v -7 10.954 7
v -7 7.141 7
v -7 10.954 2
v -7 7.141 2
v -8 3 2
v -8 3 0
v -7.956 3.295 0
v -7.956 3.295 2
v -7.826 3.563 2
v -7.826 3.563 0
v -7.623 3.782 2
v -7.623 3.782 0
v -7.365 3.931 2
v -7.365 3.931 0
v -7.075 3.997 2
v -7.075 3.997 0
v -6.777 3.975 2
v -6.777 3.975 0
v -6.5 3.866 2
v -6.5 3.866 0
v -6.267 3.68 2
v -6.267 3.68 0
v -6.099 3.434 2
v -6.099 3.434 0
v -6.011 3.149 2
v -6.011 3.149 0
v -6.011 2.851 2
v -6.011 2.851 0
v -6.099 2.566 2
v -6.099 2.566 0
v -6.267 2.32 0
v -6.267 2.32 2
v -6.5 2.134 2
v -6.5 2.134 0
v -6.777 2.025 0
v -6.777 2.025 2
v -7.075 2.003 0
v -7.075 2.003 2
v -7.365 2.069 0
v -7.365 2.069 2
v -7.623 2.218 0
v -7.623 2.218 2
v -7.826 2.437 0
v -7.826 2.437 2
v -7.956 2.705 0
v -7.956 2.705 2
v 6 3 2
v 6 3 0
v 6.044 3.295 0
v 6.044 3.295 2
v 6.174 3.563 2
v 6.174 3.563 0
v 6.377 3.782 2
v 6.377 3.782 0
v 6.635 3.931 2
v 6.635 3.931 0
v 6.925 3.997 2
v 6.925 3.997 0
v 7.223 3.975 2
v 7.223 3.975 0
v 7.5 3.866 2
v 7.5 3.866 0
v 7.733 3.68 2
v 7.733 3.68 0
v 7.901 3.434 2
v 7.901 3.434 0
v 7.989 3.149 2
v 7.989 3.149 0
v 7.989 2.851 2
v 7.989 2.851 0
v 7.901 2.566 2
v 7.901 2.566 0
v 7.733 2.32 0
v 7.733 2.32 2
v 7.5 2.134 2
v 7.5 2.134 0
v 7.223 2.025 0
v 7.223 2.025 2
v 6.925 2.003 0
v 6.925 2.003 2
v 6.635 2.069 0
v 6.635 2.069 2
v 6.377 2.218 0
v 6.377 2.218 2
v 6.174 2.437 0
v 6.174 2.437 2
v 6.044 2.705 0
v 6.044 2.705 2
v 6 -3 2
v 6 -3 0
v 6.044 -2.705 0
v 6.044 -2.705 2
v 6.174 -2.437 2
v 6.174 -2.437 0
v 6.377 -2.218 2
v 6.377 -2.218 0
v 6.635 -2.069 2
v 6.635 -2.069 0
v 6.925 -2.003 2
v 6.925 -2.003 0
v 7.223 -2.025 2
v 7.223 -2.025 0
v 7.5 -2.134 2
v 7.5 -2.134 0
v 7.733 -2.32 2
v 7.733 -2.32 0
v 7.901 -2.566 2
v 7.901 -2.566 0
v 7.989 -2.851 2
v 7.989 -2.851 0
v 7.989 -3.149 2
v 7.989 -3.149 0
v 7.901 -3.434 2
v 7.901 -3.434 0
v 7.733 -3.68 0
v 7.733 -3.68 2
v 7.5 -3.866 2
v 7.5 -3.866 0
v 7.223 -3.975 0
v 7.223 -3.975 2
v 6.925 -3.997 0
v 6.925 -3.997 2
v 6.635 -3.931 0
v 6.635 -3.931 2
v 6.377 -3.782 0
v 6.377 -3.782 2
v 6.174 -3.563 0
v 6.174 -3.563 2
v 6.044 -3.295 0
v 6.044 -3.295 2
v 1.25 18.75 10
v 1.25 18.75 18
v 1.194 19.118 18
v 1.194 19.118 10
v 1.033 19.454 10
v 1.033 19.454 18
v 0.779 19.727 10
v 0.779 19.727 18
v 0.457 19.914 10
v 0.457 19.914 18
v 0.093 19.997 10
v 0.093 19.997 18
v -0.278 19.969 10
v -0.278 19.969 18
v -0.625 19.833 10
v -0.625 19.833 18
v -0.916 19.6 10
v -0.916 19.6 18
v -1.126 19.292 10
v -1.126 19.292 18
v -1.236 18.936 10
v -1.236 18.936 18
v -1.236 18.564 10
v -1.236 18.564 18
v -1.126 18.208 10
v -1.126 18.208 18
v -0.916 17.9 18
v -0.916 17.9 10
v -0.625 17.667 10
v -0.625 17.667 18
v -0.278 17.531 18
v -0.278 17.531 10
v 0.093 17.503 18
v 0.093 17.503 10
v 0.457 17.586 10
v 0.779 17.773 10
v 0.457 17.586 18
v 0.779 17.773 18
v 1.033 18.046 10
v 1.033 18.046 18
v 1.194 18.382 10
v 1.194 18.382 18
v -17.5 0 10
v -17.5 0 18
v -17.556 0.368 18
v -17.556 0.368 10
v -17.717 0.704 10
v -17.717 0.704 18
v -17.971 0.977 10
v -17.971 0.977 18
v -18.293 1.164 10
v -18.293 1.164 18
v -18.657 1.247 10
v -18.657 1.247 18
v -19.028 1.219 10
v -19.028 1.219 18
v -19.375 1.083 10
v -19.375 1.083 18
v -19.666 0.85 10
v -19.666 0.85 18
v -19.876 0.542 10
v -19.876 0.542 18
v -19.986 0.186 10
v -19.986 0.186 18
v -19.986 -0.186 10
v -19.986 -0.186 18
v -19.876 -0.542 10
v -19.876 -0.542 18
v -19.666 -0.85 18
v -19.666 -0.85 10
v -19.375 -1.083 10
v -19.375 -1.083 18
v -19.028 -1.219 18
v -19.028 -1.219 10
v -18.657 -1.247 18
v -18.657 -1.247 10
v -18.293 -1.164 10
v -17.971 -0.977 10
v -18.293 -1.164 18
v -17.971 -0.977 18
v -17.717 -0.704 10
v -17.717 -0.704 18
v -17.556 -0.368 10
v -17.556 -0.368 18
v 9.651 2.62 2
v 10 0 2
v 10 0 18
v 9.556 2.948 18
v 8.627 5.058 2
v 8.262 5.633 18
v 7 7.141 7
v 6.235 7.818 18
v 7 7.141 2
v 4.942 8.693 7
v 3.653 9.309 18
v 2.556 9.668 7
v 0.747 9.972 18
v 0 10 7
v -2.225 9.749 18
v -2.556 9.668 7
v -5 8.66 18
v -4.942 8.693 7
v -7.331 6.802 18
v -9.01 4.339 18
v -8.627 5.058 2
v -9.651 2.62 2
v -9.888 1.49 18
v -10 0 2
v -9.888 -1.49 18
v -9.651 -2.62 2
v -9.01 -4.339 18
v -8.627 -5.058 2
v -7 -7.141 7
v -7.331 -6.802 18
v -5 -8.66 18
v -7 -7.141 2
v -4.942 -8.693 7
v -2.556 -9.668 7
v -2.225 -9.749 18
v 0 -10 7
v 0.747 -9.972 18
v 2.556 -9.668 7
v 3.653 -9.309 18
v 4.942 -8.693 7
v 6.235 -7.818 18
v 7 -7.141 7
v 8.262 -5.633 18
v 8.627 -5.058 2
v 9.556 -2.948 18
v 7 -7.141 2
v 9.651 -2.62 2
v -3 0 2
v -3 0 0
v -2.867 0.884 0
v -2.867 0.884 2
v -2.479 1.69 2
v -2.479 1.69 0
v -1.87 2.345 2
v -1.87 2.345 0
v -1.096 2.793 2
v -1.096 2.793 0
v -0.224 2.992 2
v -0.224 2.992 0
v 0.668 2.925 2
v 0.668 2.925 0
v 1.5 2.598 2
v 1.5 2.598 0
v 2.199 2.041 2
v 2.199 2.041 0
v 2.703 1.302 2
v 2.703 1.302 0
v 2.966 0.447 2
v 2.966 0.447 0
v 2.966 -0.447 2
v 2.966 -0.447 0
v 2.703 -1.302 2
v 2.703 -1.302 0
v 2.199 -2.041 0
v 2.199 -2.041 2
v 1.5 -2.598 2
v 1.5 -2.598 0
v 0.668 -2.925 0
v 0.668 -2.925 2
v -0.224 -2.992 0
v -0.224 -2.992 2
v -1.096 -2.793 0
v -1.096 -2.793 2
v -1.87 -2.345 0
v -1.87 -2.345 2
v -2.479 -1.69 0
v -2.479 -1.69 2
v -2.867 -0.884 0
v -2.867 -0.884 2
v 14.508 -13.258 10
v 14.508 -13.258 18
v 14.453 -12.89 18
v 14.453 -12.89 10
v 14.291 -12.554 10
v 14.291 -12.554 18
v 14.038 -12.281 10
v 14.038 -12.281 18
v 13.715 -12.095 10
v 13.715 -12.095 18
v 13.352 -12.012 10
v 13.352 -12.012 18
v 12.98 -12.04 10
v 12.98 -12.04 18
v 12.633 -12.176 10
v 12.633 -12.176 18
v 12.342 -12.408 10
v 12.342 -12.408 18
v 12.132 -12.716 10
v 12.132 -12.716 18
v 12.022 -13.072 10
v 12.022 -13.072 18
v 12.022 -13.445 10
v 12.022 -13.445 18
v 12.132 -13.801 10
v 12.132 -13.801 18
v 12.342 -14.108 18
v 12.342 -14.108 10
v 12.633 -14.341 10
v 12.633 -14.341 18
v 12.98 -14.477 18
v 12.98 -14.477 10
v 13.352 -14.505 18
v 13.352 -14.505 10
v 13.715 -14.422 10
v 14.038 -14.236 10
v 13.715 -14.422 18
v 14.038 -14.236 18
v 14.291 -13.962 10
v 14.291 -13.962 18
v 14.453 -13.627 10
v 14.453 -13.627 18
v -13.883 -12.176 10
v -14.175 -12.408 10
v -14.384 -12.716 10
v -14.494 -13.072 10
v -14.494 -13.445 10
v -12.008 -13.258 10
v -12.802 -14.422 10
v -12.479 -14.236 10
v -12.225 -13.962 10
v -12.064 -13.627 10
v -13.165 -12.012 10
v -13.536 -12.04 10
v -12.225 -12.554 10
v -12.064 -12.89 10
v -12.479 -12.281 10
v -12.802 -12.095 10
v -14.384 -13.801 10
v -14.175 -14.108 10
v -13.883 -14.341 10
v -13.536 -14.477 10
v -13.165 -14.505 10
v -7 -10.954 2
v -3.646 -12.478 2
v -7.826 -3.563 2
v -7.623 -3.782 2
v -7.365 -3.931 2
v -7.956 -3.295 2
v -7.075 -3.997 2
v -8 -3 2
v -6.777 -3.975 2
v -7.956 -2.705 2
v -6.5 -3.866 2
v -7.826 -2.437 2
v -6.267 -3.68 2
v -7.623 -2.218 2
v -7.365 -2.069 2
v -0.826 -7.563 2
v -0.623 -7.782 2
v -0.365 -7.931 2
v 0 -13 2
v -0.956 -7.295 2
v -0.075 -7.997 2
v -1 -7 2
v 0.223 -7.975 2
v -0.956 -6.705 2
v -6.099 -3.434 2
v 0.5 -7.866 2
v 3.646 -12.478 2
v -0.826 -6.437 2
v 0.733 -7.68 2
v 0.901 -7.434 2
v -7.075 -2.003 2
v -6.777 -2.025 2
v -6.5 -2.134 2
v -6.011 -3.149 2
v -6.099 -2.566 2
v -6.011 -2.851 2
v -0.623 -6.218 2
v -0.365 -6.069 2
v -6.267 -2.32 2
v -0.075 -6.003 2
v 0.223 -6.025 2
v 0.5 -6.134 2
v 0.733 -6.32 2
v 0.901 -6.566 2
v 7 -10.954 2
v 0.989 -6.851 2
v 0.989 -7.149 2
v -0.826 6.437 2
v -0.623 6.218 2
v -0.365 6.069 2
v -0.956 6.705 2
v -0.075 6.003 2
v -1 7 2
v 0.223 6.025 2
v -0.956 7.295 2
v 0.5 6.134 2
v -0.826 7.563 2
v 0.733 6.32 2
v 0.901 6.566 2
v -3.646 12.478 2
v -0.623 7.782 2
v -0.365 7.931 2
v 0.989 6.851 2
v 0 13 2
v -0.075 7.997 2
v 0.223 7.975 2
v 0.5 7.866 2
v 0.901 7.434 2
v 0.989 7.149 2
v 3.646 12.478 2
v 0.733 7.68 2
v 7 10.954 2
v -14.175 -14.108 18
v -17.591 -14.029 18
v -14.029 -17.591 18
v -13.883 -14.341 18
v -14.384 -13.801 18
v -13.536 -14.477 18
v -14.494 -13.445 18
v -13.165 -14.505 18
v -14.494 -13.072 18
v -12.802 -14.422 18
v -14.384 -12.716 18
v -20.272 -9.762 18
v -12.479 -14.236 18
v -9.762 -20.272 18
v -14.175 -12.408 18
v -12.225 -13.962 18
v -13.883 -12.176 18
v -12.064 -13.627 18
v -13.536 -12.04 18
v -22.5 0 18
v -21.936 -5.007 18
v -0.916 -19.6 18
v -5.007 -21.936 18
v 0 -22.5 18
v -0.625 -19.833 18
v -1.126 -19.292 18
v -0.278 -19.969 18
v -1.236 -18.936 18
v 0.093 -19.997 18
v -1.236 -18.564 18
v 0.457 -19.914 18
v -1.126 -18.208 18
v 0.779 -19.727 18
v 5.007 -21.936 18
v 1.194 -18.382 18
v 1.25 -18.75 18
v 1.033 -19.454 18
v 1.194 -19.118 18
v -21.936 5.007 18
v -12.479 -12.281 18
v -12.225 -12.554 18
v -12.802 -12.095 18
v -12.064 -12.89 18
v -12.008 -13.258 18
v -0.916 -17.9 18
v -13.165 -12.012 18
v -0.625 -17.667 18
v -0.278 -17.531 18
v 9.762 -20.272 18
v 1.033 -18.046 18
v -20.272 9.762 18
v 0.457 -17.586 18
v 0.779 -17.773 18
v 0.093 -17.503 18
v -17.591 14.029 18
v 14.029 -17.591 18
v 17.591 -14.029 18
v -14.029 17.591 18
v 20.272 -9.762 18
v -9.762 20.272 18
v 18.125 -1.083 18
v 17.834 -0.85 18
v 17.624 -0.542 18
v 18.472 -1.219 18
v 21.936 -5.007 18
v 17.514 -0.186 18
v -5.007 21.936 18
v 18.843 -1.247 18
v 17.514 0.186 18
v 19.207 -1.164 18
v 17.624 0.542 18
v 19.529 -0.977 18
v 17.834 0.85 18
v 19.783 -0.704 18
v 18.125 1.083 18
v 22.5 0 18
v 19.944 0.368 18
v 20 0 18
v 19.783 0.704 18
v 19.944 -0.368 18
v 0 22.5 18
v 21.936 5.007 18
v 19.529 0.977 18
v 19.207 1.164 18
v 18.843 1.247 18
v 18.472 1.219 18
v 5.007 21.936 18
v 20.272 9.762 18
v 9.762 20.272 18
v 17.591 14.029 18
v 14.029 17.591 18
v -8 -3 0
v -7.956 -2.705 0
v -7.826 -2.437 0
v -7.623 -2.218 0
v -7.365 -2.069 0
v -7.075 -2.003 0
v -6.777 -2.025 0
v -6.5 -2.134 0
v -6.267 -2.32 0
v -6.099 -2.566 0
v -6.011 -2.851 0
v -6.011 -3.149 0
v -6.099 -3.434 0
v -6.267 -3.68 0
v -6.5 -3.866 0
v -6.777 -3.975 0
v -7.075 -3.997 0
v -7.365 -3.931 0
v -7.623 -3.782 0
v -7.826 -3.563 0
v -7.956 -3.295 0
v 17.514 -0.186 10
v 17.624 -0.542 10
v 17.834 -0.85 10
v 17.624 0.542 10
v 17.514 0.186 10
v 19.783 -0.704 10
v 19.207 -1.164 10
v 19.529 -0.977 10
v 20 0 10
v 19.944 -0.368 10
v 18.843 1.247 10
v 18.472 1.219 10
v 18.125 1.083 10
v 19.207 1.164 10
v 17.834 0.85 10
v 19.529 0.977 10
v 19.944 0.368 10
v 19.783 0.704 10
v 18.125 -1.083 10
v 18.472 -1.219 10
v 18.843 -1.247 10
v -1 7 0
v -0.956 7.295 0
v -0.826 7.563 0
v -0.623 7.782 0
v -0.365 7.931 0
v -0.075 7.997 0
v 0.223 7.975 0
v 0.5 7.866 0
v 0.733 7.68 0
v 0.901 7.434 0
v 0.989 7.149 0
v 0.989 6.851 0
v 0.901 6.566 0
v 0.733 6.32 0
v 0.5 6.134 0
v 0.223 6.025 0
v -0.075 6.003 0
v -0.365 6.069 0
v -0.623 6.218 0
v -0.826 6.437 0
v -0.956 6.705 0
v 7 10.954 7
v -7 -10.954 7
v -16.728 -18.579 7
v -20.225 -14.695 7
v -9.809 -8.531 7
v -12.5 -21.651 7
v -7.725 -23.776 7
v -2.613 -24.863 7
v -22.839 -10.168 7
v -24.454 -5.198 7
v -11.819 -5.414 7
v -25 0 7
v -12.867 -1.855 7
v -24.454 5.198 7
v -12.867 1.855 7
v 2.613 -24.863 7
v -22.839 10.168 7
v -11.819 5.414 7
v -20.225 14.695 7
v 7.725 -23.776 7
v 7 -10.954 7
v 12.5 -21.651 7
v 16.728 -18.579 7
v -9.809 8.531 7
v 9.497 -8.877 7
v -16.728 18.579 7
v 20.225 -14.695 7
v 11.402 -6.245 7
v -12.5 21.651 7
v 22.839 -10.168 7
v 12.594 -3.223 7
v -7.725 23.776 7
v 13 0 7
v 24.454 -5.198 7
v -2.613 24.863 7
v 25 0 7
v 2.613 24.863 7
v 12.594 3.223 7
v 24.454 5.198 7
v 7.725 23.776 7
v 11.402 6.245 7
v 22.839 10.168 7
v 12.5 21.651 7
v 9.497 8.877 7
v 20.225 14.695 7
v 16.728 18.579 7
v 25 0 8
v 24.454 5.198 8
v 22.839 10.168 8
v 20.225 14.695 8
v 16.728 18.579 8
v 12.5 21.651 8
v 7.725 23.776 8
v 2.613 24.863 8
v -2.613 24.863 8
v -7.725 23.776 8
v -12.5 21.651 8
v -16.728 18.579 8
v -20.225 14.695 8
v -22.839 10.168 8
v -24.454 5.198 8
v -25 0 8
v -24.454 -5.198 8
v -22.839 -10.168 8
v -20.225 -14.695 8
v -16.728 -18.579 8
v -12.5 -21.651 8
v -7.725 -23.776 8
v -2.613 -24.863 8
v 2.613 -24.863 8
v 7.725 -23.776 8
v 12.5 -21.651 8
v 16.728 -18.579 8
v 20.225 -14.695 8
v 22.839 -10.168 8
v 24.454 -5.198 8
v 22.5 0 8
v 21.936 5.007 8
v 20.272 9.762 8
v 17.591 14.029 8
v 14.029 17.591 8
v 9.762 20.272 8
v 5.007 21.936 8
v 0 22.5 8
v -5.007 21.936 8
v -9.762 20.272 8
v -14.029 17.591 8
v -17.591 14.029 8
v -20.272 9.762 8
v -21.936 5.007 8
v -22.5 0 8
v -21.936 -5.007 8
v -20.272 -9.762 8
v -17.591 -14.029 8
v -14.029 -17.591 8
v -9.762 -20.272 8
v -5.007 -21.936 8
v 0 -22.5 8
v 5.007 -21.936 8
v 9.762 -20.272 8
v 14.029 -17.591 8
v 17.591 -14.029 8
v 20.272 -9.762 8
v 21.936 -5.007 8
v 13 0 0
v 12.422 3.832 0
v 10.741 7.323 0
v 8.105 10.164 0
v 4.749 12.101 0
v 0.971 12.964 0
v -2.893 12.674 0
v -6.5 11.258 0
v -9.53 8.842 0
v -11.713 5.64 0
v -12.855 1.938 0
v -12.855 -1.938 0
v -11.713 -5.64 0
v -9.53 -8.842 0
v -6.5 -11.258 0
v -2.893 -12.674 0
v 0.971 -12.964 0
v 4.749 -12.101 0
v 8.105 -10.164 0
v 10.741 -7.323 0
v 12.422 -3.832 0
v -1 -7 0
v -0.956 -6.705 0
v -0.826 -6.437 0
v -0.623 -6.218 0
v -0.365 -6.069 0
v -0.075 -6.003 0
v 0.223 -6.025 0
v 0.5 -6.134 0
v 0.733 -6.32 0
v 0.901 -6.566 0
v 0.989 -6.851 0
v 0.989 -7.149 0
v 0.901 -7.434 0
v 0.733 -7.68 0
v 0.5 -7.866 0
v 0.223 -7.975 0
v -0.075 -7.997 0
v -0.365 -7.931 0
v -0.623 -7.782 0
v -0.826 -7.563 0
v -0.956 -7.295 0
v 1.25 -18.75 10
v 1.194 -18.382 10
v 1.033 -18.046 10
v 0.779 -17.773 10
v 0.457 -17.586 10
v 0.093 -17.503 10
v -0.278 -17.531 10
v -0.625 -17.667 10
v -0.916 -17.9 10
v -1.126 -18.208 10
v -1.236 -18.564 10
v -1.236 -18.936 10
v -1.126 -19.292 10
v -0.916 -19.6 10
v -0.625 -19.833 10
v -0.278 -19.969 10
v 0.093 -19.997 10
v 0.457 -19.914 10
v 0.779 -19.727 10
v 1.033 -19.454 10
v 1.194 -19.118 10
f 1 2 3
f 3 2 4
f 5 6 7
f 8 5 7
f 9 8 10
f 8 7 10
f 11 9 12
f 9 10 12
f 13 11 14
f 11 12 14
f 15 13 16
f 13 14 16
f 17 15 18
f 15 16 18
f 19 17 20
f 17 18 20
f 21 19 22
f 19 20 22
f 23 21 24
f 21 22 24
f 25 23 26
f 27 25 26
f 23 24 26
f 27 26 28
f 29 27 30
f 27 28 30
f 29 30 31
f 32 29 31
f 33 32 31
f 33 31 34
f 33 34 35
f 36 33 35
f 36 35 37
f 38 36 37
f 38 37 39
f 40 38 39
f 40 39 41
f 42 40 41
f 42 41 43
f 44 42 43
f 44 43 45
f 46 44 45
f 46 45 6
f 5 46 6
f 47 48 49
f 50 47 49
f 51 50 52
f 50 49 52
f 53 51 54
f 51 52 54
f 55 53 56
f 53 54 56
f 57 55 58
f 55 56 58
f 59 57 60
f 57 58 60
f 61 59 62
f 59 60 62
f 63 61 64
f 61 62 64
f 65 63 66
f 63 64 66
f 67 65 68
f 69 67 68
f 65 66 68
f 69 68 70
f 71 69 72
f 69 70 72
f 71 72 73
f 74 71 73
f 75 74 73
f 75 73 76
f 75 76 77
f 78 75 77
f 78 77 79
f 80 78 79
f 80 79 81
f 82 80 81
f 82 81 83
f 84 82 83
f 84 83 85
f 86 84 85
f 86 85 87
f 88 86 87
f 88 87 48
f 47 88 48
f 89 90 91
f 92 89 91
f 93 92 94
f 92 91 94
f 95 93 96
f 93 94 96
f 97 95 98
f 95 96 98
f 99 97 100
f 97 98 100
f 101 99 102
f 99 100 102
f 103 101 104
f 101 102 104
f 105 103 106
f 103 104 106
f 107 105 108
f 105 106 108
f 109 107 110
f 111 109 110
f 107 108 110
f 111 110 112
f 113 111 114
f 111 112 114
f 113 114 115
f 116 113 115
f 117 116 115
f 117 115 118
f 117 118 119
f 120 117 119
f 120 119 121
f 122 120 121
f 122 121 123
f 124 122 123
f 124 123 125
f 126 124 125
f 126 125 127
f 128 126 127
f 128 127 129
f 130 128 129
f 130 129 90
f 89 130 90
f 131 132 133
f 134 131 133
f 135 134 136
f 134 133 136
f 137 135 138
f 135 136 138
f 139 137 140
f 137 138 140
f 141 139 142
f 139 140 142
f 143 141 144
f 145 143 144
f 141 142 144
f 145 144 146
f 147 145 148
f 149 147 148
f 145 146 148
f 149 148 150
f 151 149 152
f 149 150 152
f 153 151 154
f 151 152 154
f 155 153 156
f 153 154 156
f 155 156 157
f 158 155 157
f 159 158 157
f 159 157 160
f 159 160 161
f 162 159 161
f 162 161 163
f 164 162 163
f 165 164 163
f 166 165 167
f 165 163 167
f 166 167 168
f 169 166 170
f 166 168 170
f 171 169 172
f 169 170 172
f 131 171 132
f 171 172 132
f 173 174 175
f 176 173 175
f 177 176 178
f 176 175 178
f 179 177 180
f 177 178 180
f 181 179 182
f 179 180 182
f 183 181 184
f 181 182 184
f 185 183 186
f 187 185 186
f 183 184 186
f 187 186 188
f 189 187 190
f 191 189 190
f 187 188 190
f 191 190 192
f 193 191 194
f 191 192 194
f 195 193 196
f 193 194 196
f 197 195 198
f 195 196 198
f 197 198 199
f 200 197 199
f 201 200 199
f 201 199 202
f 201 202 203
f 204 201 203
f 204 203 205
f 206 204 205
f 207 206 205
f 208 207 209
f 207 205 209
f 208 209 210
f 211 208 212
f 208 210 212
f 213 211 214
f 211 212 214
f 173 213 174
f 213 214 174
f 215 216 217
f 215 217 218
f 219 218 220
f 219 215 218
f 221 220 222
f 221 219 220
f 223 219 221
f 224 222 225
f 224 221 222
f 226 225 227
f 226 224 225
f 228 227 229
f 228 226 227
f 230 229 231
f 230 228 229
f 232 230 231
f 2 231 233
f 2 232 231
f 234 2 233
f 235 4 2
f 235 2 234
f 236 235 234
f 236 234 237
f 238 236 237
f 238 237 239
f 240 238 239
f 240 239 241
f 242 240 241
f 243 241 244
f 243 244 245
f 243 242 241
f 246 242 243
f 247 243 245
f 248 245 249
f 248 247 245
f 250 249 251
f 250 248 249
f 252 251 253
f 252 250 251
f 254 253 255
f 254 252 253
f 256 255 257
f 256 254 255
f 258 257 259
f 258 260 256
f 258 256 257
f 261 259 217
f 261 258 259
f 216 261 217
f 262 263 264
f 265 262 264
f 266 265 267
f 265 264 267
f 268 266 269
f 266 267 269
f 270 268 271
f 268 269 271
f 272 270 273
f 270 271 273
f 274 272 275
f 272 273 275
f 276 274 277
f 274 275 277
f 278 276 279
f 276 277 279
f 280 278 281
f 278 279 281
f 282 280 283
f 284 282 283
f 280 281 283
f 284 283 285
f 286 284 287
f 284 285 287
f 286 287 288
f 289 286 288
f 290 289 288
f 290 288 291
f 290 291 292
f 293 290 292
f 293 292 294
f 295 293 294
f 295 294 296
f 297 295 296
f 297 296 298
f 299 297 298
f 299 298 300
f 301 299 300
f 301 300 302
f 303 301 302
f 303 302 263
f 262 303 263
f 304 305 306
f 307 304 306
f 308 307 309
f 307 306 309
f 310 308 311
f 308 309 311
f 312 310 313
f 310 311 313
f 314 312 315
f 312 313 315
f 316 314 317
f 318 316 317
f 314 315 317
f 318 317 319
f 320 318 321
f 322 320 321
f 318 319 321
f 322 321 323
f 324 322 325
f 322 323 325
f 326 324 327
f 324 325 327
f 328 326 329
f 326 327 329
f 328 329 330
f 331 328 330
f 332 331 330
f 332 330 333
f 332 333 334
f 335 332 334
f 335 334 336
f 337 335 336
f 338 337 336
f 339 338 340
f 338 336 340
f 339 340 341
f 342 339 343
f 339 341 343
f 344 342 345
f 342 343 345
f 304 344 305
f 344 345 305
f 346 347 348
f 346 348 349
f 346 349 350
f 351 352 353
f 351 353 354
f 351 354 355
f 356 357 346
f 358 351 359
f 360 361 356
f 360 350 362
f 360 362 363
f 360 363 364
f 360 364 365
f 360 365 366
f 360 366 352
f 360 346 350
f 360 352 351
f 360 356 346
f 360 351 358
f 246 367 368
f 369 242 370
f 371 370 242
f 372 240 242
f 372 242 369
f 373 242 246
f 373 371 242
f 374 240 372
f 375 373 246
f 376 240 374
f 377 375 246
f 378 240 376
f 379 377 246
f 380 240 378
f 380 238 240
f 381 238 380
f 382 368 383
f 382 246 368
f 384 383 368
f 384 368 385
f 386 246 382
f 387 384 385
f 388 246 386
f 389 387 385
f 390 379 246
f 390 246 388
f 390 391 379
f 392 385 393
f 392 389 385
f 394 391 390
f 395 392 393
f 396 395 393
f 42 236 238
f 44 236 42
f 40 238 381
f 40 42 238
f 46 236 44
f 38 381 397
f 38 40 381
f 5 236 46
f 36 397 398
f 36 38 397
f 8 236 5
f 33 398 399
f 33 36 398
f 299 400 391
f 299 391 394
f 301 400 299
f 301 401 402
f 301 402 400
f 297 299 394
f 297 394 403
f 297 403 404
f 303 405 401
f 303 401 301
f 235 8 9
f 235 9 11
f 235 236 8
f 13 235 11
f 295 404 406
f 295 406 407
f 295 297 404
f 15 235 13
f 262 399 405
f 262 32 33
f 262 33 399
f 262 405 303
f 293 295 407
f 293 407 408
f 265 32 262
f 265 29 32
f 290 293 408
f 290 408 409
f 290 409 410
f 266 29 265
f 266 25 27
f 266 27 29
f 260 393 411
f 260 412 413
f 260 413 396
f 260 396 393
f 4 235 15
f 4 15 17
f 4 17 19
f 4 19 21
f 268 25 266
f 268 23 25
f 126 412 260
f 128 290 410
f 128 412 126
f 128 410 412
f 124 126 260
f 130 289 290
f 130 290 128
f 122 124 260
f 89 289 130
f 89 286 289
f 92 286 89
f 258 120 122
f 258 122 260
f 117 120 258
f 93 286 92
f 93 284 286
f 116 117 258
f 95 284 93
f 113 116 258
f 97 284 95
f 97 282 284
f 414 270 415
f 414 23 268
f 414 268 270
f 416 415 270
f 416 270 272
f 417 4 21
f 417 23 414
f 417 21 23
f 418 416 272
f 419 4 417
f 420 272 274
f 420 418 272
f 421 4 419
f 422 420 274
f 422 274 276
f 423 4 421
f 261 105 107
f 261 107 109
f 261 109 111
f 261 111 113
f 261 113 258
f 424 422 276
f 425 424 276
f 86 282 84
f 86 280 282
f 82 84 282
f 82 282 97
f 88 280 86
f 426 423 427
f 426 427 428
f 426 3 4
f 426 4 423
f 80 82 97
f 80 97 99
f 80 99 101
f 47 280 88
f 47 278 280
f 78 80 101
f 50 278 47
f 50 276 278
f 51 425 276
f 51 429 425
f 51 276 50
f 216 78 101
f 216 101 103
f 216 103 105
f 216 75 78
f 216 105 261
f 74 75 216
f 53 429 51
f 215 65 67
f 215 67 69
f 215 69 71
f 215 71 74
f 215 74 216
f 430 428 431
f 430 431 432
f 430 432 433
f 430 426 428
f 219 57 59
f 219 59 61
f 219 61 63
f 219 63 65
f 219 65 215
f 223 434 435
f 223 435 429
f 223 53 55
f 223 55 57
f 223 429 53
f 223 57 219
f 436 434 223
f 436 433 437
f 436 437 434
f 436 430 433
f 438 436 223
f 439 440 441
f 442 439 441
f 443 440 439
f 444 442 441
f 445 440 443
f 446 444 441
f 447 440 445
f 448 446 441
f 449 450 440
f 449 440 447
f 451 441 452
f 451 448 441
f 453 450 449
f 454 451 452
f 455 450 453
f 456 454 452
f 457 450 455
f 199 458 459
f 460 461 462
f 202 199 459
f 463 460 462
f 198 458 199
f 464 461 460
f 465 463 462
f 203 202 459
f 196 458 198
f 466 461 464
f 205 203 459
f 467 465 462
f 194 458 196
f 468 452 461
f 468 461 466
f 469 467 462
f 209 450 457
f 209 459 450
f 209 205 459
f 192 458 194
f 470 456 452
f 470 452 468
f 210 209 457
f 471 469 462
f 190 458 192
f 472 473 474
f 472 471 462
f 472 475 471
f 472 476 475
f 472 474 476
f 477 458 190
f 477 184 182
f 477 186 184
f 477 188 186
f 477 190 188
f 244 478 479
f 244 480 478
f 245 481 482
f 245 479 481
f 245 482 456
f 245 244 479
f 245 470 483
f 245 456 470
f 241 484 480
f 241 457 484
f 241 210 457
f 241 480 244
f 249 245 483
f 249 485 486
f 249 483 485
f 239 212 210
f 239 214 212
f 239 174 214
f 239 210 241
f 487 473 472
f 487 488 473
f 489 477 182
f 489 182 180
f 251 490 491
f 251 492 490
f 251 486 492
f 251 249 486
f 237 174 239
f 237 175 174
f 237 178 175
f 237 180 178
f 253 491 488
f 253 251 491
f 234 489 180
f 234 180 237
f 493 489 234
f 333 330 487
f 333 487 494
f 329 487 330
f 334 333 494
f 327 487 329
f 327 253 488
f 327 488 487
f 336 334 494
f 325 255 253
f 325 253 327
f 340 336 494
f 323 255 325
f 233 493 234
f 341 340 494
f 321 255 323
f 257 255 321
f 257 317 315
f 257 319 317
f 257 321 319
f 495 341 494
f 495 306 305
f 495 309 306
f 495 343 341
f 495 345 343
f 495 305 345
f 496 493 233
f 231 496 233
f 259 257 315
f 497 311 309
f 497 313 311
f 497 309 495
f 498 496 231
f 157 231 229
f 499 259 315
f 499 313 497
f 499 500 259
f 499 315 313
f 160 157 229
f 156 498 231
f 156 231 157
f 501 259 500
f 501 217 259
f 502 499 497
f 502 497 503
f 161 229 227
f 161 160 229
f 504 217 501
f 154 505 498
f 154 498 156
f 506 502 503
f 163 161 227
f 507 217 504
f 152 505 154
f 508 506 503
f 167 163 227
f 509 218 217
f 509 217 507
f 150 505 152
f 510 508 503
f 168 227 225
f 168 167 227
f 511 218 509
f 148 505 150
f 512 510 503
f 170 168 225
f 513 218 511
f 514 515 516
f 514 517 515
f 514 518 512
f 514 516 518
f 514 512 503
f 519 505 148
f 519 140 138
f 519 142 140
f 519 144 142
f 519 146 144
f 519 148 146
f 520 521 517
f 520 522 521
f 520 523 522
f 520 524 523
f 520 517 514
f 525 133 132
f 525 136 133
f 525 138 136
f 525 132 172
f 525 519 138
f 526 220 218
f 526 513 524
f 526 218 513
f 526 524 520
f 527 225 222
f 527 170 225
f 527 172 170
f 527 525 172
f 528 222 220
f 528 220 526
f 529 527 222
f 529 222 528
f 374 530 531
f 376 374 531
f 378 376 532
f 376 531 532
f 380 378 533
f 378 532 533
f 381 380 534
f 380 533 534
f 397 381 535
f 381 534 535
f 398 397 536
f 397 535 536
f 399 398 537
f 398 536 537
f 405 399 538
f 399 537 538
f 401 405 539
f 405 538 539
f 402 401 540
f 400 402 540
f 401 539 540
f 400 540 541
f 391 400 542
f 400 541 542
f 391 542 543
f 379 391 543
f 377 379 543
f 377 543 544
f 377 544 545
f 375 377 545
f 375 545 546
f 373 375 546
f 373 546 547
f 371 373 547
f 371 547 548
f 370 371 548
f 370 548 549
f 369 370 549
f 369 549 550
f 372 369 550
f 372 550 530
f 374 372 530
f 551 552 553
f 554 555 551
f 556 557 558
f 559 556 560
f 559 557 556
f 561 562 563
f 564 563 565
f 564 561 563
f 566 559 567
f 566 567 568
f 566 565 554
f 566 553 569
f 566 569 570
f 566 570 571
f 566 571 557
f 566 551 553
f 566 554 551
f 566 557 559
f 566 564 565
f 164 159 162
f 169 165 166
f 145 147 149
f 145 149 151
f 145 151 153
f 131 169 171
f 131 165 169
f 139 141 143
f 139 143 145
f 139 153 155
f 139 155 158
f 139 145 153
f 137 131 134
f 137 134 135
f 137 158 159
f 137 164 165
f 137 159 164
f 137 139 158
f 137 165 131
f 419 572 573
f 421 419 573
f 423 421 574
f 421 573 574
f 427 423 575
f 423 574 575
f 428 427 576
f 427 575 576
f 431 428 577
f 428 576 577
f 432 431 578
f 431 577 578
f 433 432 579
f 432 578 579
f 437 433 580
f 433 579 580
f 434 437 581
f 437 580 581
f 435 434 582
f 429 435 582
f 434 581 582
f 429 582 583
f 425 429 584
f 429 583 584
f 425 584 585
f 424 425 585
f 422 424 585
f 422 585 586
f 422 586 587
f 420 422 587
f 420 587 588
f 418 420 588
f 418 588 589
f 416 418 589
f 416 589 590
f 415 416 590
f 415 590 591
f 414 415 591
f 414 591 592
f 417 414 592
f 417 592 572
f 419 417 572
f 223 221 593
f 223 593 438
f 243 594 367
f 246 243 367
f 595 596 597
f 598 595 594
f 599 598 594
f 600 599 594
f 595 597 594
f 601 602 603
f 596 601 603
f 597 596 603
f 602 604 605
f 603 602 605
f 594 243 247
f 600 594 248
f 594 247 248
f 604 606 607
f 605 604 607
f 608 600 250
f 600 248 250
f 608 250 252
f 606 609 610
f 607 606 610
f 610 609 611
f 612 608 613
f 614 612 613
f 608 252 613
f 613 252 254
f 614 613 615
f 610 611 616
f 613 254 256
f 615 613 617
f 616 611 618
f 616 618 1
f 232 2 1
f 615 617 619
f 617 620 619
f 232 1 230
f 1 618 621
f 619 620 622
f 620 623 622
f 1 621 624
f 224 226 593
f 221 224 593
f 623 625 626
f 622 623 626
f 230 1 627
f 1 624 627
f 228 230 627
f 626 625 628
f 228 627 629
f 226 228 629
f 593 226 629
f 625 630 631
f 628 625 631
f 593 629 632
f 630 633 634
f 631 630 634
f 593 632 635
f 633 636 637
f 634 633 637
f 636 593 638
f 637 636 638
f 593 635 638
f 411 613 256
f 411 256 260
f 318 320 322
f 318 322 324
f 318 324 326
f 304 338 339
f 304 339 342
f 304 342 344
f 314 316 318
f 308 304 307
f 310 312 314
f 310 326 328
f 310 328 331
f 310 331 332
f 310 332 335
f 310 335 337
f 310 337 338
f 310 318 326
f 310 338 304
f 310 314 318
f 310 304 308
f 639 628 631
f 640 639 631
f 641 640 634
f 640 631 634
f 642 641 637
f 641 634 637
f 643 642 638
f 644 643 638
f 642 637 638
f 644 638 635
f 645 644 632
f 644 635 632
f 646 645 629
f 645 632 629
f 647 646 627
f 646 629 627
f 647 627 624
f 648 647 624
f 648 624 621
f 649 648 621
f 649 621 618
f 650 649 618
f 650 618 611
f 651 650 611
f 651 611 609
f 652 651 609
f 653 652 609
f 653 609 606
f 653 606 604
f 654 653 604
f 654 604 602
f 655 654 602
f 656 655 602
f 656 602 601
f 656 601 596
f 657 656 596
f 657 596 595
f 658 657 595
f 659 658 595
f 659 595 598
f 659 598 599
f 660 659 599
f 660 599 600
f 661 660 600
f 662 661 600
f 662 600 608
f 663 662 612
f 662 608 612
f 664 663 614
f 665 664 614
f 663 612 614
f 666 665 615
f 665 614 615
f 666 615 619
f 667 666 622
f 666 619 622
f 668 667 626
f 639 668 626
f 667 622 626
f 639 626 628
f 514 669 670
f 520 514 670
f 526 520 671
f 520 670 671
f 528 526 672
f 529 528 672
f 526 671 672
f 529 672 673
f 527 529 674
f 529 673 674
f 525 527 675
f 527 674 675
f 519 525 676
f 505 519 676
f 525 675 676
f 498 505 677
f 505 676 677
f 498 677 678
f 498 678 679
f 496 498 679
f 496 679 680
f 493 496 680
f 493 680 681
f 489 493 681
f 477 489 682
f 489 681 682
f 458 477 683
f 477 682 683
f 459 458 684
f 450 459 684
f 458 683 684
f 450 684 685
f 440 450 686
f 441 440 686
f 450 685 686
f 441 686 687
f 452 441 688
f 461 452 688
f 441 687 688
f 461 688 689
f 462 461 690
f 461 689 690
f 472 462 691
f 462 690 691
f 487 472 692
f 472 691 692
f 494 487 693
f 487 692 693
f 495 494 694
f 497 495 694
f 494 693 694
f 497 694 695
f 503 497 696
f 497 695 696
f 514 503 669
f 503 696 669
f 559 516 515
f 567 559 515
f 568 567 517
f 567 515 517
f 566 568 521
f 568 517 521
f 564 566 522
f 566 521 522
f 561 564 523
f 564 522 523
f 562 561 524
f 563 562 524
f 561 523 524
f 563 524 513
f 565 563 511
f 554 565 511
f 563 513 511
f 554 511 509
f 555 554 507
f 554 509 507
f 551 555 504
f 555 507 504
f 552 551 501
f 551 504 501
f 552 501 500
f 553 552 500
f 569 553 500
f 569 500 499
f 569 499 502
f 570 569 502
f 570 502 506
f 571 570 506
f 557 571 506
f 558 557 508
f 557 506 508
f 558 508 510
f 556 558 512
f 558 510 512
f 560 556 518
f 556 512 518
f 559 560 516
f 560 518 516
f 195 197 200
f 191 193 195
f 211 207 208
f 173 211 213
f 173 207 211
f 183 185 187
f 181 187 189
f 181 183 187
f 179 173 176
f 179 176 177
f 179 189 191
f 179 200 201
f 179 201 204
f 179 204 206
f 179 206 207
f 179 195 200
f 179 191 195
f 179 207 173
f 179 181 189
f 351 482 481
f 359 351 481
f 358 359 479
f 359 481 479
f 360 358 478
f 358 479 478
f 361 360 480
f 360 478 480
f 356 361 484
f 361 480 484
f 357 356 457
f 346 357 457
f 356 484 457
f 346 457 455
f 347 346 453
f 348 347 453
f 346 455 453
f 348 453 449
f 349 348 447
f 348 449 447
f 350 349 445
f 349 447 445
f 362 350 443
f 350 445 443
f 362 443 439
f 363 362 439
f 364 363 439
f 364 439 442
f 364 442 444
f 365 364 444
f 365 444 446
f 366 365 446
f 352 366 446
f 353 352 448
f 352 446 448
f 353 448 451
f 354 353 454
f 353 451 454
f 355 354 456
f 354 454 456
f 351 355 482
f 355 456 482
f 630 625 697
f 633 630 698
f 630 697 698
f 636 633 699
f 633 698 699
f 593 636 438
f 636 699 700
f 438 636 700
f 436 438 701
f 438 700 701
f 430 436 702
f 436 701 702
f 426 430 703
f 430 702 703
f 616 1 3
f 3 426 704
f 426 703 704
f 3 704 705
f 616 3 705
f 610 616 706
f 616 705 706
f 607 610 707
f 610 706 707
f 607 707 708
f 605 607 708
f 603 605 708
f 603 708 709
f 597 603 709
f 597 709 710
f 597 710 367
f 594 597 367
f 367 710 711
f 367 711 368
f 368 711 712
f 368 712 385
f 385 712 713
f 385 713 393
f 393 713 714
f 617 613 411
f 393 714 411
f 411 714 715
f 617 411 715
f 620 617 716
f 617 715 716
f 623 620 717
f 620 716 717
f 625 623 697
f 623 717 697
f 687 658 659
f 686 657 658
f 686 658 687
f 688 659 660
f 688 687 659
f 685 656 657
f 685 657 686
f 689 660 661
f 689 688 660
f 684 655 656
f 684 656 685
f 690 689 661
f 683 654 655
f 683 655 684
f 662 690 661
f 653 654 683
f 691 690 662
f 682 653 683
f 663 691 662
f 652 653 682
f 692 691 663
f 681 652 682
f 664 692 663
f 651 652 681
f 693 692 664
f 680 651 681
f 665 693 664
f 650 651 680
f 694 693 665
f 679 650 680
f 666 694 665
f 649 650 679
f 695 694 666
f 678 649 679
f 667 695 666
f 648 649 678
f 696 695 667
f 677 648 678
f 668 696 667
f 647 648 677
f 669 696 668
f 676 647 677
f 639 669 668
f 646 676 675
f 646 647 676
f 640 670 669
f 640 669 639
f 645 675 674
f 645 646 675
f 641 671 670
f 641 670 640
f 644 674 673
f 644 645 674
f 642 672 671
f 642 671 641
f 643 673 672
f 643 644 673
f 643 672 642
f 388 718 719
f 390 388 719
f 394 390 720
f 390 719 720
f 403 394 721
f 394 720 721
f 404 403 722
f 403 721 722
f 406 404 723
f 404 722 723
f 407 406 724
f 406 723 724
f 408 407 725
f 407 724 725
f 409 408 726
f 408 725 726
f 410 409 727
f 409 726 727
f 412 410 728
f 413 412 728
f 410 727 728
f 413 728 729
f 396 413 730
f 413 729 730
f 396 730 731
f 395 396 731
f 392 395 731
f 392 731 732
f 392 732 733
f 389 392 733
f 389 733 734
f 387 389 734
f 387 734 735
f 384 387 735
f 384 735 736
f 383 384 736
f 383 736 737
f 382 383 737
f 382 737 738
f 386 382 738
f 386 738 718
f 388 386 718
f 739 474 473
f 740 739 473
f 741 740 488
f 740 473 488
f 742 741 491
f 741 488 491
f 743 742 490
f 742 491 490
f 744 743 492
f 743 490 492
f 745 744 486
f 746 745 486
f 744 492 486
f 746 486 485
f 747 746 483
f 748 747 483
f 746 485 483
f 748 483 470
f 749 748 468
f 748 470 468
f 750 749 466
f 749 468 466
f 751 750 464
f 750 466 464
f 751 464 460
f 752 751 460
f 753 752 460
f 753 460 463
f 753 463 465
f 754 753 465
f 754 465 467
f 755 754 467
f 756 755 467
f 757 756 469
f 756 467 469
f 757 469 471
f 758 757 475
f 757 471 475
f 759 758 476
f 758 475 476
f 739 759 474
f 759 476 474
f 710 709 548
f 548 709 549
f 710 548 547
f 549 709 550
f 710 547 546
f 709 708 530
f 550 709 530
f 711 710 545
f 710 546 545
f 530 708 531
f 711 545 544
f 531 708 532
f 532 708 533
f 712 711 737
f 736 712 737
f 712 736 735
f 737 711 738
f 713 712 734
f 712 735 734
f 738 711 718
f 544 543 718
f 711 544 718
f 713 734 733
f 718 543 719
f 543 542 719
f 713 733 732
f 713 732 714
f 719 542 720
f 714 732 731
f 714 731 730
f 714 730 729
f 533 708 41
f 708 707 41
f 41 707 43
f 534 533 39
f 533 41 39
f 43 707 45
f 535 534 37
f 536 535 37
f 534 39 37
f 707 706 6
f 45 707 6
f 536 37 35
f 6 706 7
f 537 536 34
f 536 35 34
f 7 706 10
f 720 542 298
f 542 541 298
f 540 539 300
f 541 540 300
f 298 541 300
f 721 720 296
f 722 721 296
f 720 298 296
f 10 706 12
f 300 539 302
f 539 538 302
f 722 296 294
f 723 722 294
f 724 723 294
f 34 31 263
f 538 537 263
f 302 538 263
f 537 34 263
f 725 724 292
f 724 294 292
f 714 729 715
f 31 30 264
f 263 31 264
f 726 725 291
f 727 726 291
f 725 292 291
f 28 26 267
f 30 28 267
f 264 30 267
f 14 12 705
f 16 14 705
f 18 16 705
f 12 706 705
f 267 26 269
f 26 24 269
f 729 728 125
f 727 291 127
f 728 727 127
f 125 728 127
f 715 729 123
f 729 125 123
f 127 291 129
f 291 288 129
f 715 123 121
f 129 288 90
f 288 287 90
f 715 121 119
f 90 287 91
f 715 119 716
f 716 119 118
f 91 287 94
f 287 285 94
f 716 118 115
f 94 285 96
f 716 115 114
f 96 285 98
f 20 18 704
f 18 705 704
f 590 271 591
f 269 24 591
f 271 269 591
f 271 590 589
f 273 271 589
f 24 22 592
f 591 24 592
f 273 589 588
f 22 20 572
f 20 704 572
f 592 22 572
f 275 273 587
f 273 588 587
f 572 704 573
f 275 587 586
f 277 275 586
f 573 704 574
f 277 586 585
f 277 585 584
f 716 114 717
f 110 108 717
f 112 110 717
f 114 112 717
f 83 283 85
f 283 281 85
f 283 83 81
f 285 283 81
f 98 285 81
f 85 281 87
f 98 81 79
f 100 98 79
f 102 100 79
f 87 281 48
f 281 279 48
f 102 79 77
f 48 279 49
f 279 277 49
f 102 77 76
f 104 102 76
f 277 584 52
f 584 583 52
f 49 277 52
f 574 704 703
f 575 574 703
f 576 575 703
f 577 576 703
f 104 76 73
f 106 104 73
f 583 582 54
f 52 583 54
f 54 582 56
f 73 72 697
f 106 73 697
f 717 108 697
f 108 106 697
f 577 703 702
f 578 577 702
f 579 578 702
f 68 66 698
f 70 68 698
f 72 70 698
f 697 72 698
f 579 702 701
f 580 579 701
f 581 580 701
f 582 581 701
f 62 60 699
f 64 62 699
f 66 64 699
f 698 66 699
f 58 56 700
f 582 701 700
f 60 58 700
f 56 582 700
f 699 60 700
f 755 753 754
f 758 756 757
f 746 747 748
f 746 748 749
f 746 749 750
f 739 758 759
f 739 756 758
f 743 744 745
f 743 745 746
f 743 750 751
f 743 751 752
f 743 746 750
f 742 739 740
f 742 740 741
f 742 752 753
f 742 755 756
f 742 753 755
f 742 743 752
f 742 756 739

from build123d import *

# Parameters (mm, degrees)
SKETCH_1_R               = 13
EXTRUDE_1_DEPTH          = 2
SKETCH_2_R               = 13
SKETCH_2_R_2             = 10
EXTRUDE_2_DEPTH          = 5
SKETCH_4_R               = 25
SKETCH_4_R_2             = 10
EXTRUDE_3_DEPTH          = 1
SKETCH_5_R               = 22.5
SKETCH_5_R_2             = 10
EXTRUDE_4_DEPTH          = 10
SKETCH_6_R               = 1.25
CUT_EXTRUDE_1_DEPTH      = 8
SKETCH_7_R               = 3
SKETCH_7_R_2             = 1
CUT_EXTRUDE_2_DEPTH      = 40.67366885
CUT_EXTRUDE_3_DEPTH      = 40.67366885
CUT_EXTRUDE_3_DEPTH_BACK = 40.67366885
SKETCH_8_W               = 14
SKETCH_8_H               = 5


with BuildPart() as part:
    # 스케치1 → 보스-돌출1 (new body)
    with BuildSketch(Plane.XY):
        Circle(SKETCH_1_R)
    extrude(amount=EXTRUDE_1_DEPTH)

    # 스케치2 → 보스-돌출2 (add)
    with BuildSketch(Plane.XY.offset(2)):
        Circle(SKETCH_2_R)
        Circle(SKETCH_2_R_2, mode=Mode.SUBTRACT)
    extrude(amount=EXTRUDE_2_DEPTH)

    # 스케치4 → 보스-돌출3 (add)
    with BuildSketch(Plane.XY.offset(7)):
        Circle(SKETCH_4_R)
        Circle(SKETCH_4_R_2, mode=Mode.SUBTRACT)
    extrude(amount=EXTRUDE_3_DEPTH)

    # 스케치5 → 보스-돌출4 (add)
    with BuildSketch(Plane.XY.offset(8)):
        Circle(SKETCH_5_R)
        Circle(SKETCH_5_R_2, mode=Mode.SUBTRACT)
    extrude(amount=EXTRUDE_4_DEPTH)

    # 스케치6 → 컷-돌출1 (cut)
    with BuildSketch(Plane.XY.offset(18)):
        with Locations((0, 18.75)):
            Circle(SKETCH_6_R)
        with Locations((18.75, 0)):
            Circle(SKETCH_6_R)
        with Locations((13.258252147, -13.258252147)):
            Circle(SKETCH_6_R)
        with Locations((0, -18.75)):
            Circle(SKETCH_6_R)
        with Locations((-13.258252147, -13.258252147)):
            Circle(SKETCH_6_R)
        with Locations((-18.75, 0)):
            Circle(SKETCH_6_R)
    extrude(amount=-CUT_EXTRUDE_1_DEPTH, mode=Mode.SUBTRACT)

    # 스케치7 → 컷-돌출2 (cut, through all)
    with BuildSketch(Plane(origin=(0, 0, 0), x_dir=(-1, 0, 0), z_dir=(0, 0, -1))):
        Circle(SKETCH_7_R)
        with Locations((0, 7)):
            Circle(SKETCH_7_R_2)
        with Locations((0, -7)):
            Circle(SKETCH_7_R_2)
        with Locations((-7, 3)):
            Circle(SKETCH_7_R_2)
        with Locations((-7, -3)):
            Circle(SKETCH_7_R_2)
        with Locations((7, 3)):
            Circle(SKETCH_7_R_2)
        with Locations((7, -3)):
            Circle(SKETCH_7_R_2)
    extrude(amount=-CUT_EXTRUDE_2_DEPTH, mode=Mode.SUBTRACT)

    # 스케치8 → 컷-돌출3 (cut, two sides: drawn at the far end of the back side and taken through both)
    with BuildSketch(Plane(origin=(0, 0, 0), x_dir=(1, 0, 0), z_dir=(0, 1, 0)).offset(-CUT_EXTRUDE_3_DEPTH_BACK)):
        with Locations((0, -4.5)):
            Rectangle(SKETCH_8_W, SKETCH_8_H)
    extrude(amount=CUT_EXTRUDE_3_DEPTH + CUT_EXTRUDE_3_DEPTH_BACK, mode=Mode.SUBTRACT)


solid = part.part
